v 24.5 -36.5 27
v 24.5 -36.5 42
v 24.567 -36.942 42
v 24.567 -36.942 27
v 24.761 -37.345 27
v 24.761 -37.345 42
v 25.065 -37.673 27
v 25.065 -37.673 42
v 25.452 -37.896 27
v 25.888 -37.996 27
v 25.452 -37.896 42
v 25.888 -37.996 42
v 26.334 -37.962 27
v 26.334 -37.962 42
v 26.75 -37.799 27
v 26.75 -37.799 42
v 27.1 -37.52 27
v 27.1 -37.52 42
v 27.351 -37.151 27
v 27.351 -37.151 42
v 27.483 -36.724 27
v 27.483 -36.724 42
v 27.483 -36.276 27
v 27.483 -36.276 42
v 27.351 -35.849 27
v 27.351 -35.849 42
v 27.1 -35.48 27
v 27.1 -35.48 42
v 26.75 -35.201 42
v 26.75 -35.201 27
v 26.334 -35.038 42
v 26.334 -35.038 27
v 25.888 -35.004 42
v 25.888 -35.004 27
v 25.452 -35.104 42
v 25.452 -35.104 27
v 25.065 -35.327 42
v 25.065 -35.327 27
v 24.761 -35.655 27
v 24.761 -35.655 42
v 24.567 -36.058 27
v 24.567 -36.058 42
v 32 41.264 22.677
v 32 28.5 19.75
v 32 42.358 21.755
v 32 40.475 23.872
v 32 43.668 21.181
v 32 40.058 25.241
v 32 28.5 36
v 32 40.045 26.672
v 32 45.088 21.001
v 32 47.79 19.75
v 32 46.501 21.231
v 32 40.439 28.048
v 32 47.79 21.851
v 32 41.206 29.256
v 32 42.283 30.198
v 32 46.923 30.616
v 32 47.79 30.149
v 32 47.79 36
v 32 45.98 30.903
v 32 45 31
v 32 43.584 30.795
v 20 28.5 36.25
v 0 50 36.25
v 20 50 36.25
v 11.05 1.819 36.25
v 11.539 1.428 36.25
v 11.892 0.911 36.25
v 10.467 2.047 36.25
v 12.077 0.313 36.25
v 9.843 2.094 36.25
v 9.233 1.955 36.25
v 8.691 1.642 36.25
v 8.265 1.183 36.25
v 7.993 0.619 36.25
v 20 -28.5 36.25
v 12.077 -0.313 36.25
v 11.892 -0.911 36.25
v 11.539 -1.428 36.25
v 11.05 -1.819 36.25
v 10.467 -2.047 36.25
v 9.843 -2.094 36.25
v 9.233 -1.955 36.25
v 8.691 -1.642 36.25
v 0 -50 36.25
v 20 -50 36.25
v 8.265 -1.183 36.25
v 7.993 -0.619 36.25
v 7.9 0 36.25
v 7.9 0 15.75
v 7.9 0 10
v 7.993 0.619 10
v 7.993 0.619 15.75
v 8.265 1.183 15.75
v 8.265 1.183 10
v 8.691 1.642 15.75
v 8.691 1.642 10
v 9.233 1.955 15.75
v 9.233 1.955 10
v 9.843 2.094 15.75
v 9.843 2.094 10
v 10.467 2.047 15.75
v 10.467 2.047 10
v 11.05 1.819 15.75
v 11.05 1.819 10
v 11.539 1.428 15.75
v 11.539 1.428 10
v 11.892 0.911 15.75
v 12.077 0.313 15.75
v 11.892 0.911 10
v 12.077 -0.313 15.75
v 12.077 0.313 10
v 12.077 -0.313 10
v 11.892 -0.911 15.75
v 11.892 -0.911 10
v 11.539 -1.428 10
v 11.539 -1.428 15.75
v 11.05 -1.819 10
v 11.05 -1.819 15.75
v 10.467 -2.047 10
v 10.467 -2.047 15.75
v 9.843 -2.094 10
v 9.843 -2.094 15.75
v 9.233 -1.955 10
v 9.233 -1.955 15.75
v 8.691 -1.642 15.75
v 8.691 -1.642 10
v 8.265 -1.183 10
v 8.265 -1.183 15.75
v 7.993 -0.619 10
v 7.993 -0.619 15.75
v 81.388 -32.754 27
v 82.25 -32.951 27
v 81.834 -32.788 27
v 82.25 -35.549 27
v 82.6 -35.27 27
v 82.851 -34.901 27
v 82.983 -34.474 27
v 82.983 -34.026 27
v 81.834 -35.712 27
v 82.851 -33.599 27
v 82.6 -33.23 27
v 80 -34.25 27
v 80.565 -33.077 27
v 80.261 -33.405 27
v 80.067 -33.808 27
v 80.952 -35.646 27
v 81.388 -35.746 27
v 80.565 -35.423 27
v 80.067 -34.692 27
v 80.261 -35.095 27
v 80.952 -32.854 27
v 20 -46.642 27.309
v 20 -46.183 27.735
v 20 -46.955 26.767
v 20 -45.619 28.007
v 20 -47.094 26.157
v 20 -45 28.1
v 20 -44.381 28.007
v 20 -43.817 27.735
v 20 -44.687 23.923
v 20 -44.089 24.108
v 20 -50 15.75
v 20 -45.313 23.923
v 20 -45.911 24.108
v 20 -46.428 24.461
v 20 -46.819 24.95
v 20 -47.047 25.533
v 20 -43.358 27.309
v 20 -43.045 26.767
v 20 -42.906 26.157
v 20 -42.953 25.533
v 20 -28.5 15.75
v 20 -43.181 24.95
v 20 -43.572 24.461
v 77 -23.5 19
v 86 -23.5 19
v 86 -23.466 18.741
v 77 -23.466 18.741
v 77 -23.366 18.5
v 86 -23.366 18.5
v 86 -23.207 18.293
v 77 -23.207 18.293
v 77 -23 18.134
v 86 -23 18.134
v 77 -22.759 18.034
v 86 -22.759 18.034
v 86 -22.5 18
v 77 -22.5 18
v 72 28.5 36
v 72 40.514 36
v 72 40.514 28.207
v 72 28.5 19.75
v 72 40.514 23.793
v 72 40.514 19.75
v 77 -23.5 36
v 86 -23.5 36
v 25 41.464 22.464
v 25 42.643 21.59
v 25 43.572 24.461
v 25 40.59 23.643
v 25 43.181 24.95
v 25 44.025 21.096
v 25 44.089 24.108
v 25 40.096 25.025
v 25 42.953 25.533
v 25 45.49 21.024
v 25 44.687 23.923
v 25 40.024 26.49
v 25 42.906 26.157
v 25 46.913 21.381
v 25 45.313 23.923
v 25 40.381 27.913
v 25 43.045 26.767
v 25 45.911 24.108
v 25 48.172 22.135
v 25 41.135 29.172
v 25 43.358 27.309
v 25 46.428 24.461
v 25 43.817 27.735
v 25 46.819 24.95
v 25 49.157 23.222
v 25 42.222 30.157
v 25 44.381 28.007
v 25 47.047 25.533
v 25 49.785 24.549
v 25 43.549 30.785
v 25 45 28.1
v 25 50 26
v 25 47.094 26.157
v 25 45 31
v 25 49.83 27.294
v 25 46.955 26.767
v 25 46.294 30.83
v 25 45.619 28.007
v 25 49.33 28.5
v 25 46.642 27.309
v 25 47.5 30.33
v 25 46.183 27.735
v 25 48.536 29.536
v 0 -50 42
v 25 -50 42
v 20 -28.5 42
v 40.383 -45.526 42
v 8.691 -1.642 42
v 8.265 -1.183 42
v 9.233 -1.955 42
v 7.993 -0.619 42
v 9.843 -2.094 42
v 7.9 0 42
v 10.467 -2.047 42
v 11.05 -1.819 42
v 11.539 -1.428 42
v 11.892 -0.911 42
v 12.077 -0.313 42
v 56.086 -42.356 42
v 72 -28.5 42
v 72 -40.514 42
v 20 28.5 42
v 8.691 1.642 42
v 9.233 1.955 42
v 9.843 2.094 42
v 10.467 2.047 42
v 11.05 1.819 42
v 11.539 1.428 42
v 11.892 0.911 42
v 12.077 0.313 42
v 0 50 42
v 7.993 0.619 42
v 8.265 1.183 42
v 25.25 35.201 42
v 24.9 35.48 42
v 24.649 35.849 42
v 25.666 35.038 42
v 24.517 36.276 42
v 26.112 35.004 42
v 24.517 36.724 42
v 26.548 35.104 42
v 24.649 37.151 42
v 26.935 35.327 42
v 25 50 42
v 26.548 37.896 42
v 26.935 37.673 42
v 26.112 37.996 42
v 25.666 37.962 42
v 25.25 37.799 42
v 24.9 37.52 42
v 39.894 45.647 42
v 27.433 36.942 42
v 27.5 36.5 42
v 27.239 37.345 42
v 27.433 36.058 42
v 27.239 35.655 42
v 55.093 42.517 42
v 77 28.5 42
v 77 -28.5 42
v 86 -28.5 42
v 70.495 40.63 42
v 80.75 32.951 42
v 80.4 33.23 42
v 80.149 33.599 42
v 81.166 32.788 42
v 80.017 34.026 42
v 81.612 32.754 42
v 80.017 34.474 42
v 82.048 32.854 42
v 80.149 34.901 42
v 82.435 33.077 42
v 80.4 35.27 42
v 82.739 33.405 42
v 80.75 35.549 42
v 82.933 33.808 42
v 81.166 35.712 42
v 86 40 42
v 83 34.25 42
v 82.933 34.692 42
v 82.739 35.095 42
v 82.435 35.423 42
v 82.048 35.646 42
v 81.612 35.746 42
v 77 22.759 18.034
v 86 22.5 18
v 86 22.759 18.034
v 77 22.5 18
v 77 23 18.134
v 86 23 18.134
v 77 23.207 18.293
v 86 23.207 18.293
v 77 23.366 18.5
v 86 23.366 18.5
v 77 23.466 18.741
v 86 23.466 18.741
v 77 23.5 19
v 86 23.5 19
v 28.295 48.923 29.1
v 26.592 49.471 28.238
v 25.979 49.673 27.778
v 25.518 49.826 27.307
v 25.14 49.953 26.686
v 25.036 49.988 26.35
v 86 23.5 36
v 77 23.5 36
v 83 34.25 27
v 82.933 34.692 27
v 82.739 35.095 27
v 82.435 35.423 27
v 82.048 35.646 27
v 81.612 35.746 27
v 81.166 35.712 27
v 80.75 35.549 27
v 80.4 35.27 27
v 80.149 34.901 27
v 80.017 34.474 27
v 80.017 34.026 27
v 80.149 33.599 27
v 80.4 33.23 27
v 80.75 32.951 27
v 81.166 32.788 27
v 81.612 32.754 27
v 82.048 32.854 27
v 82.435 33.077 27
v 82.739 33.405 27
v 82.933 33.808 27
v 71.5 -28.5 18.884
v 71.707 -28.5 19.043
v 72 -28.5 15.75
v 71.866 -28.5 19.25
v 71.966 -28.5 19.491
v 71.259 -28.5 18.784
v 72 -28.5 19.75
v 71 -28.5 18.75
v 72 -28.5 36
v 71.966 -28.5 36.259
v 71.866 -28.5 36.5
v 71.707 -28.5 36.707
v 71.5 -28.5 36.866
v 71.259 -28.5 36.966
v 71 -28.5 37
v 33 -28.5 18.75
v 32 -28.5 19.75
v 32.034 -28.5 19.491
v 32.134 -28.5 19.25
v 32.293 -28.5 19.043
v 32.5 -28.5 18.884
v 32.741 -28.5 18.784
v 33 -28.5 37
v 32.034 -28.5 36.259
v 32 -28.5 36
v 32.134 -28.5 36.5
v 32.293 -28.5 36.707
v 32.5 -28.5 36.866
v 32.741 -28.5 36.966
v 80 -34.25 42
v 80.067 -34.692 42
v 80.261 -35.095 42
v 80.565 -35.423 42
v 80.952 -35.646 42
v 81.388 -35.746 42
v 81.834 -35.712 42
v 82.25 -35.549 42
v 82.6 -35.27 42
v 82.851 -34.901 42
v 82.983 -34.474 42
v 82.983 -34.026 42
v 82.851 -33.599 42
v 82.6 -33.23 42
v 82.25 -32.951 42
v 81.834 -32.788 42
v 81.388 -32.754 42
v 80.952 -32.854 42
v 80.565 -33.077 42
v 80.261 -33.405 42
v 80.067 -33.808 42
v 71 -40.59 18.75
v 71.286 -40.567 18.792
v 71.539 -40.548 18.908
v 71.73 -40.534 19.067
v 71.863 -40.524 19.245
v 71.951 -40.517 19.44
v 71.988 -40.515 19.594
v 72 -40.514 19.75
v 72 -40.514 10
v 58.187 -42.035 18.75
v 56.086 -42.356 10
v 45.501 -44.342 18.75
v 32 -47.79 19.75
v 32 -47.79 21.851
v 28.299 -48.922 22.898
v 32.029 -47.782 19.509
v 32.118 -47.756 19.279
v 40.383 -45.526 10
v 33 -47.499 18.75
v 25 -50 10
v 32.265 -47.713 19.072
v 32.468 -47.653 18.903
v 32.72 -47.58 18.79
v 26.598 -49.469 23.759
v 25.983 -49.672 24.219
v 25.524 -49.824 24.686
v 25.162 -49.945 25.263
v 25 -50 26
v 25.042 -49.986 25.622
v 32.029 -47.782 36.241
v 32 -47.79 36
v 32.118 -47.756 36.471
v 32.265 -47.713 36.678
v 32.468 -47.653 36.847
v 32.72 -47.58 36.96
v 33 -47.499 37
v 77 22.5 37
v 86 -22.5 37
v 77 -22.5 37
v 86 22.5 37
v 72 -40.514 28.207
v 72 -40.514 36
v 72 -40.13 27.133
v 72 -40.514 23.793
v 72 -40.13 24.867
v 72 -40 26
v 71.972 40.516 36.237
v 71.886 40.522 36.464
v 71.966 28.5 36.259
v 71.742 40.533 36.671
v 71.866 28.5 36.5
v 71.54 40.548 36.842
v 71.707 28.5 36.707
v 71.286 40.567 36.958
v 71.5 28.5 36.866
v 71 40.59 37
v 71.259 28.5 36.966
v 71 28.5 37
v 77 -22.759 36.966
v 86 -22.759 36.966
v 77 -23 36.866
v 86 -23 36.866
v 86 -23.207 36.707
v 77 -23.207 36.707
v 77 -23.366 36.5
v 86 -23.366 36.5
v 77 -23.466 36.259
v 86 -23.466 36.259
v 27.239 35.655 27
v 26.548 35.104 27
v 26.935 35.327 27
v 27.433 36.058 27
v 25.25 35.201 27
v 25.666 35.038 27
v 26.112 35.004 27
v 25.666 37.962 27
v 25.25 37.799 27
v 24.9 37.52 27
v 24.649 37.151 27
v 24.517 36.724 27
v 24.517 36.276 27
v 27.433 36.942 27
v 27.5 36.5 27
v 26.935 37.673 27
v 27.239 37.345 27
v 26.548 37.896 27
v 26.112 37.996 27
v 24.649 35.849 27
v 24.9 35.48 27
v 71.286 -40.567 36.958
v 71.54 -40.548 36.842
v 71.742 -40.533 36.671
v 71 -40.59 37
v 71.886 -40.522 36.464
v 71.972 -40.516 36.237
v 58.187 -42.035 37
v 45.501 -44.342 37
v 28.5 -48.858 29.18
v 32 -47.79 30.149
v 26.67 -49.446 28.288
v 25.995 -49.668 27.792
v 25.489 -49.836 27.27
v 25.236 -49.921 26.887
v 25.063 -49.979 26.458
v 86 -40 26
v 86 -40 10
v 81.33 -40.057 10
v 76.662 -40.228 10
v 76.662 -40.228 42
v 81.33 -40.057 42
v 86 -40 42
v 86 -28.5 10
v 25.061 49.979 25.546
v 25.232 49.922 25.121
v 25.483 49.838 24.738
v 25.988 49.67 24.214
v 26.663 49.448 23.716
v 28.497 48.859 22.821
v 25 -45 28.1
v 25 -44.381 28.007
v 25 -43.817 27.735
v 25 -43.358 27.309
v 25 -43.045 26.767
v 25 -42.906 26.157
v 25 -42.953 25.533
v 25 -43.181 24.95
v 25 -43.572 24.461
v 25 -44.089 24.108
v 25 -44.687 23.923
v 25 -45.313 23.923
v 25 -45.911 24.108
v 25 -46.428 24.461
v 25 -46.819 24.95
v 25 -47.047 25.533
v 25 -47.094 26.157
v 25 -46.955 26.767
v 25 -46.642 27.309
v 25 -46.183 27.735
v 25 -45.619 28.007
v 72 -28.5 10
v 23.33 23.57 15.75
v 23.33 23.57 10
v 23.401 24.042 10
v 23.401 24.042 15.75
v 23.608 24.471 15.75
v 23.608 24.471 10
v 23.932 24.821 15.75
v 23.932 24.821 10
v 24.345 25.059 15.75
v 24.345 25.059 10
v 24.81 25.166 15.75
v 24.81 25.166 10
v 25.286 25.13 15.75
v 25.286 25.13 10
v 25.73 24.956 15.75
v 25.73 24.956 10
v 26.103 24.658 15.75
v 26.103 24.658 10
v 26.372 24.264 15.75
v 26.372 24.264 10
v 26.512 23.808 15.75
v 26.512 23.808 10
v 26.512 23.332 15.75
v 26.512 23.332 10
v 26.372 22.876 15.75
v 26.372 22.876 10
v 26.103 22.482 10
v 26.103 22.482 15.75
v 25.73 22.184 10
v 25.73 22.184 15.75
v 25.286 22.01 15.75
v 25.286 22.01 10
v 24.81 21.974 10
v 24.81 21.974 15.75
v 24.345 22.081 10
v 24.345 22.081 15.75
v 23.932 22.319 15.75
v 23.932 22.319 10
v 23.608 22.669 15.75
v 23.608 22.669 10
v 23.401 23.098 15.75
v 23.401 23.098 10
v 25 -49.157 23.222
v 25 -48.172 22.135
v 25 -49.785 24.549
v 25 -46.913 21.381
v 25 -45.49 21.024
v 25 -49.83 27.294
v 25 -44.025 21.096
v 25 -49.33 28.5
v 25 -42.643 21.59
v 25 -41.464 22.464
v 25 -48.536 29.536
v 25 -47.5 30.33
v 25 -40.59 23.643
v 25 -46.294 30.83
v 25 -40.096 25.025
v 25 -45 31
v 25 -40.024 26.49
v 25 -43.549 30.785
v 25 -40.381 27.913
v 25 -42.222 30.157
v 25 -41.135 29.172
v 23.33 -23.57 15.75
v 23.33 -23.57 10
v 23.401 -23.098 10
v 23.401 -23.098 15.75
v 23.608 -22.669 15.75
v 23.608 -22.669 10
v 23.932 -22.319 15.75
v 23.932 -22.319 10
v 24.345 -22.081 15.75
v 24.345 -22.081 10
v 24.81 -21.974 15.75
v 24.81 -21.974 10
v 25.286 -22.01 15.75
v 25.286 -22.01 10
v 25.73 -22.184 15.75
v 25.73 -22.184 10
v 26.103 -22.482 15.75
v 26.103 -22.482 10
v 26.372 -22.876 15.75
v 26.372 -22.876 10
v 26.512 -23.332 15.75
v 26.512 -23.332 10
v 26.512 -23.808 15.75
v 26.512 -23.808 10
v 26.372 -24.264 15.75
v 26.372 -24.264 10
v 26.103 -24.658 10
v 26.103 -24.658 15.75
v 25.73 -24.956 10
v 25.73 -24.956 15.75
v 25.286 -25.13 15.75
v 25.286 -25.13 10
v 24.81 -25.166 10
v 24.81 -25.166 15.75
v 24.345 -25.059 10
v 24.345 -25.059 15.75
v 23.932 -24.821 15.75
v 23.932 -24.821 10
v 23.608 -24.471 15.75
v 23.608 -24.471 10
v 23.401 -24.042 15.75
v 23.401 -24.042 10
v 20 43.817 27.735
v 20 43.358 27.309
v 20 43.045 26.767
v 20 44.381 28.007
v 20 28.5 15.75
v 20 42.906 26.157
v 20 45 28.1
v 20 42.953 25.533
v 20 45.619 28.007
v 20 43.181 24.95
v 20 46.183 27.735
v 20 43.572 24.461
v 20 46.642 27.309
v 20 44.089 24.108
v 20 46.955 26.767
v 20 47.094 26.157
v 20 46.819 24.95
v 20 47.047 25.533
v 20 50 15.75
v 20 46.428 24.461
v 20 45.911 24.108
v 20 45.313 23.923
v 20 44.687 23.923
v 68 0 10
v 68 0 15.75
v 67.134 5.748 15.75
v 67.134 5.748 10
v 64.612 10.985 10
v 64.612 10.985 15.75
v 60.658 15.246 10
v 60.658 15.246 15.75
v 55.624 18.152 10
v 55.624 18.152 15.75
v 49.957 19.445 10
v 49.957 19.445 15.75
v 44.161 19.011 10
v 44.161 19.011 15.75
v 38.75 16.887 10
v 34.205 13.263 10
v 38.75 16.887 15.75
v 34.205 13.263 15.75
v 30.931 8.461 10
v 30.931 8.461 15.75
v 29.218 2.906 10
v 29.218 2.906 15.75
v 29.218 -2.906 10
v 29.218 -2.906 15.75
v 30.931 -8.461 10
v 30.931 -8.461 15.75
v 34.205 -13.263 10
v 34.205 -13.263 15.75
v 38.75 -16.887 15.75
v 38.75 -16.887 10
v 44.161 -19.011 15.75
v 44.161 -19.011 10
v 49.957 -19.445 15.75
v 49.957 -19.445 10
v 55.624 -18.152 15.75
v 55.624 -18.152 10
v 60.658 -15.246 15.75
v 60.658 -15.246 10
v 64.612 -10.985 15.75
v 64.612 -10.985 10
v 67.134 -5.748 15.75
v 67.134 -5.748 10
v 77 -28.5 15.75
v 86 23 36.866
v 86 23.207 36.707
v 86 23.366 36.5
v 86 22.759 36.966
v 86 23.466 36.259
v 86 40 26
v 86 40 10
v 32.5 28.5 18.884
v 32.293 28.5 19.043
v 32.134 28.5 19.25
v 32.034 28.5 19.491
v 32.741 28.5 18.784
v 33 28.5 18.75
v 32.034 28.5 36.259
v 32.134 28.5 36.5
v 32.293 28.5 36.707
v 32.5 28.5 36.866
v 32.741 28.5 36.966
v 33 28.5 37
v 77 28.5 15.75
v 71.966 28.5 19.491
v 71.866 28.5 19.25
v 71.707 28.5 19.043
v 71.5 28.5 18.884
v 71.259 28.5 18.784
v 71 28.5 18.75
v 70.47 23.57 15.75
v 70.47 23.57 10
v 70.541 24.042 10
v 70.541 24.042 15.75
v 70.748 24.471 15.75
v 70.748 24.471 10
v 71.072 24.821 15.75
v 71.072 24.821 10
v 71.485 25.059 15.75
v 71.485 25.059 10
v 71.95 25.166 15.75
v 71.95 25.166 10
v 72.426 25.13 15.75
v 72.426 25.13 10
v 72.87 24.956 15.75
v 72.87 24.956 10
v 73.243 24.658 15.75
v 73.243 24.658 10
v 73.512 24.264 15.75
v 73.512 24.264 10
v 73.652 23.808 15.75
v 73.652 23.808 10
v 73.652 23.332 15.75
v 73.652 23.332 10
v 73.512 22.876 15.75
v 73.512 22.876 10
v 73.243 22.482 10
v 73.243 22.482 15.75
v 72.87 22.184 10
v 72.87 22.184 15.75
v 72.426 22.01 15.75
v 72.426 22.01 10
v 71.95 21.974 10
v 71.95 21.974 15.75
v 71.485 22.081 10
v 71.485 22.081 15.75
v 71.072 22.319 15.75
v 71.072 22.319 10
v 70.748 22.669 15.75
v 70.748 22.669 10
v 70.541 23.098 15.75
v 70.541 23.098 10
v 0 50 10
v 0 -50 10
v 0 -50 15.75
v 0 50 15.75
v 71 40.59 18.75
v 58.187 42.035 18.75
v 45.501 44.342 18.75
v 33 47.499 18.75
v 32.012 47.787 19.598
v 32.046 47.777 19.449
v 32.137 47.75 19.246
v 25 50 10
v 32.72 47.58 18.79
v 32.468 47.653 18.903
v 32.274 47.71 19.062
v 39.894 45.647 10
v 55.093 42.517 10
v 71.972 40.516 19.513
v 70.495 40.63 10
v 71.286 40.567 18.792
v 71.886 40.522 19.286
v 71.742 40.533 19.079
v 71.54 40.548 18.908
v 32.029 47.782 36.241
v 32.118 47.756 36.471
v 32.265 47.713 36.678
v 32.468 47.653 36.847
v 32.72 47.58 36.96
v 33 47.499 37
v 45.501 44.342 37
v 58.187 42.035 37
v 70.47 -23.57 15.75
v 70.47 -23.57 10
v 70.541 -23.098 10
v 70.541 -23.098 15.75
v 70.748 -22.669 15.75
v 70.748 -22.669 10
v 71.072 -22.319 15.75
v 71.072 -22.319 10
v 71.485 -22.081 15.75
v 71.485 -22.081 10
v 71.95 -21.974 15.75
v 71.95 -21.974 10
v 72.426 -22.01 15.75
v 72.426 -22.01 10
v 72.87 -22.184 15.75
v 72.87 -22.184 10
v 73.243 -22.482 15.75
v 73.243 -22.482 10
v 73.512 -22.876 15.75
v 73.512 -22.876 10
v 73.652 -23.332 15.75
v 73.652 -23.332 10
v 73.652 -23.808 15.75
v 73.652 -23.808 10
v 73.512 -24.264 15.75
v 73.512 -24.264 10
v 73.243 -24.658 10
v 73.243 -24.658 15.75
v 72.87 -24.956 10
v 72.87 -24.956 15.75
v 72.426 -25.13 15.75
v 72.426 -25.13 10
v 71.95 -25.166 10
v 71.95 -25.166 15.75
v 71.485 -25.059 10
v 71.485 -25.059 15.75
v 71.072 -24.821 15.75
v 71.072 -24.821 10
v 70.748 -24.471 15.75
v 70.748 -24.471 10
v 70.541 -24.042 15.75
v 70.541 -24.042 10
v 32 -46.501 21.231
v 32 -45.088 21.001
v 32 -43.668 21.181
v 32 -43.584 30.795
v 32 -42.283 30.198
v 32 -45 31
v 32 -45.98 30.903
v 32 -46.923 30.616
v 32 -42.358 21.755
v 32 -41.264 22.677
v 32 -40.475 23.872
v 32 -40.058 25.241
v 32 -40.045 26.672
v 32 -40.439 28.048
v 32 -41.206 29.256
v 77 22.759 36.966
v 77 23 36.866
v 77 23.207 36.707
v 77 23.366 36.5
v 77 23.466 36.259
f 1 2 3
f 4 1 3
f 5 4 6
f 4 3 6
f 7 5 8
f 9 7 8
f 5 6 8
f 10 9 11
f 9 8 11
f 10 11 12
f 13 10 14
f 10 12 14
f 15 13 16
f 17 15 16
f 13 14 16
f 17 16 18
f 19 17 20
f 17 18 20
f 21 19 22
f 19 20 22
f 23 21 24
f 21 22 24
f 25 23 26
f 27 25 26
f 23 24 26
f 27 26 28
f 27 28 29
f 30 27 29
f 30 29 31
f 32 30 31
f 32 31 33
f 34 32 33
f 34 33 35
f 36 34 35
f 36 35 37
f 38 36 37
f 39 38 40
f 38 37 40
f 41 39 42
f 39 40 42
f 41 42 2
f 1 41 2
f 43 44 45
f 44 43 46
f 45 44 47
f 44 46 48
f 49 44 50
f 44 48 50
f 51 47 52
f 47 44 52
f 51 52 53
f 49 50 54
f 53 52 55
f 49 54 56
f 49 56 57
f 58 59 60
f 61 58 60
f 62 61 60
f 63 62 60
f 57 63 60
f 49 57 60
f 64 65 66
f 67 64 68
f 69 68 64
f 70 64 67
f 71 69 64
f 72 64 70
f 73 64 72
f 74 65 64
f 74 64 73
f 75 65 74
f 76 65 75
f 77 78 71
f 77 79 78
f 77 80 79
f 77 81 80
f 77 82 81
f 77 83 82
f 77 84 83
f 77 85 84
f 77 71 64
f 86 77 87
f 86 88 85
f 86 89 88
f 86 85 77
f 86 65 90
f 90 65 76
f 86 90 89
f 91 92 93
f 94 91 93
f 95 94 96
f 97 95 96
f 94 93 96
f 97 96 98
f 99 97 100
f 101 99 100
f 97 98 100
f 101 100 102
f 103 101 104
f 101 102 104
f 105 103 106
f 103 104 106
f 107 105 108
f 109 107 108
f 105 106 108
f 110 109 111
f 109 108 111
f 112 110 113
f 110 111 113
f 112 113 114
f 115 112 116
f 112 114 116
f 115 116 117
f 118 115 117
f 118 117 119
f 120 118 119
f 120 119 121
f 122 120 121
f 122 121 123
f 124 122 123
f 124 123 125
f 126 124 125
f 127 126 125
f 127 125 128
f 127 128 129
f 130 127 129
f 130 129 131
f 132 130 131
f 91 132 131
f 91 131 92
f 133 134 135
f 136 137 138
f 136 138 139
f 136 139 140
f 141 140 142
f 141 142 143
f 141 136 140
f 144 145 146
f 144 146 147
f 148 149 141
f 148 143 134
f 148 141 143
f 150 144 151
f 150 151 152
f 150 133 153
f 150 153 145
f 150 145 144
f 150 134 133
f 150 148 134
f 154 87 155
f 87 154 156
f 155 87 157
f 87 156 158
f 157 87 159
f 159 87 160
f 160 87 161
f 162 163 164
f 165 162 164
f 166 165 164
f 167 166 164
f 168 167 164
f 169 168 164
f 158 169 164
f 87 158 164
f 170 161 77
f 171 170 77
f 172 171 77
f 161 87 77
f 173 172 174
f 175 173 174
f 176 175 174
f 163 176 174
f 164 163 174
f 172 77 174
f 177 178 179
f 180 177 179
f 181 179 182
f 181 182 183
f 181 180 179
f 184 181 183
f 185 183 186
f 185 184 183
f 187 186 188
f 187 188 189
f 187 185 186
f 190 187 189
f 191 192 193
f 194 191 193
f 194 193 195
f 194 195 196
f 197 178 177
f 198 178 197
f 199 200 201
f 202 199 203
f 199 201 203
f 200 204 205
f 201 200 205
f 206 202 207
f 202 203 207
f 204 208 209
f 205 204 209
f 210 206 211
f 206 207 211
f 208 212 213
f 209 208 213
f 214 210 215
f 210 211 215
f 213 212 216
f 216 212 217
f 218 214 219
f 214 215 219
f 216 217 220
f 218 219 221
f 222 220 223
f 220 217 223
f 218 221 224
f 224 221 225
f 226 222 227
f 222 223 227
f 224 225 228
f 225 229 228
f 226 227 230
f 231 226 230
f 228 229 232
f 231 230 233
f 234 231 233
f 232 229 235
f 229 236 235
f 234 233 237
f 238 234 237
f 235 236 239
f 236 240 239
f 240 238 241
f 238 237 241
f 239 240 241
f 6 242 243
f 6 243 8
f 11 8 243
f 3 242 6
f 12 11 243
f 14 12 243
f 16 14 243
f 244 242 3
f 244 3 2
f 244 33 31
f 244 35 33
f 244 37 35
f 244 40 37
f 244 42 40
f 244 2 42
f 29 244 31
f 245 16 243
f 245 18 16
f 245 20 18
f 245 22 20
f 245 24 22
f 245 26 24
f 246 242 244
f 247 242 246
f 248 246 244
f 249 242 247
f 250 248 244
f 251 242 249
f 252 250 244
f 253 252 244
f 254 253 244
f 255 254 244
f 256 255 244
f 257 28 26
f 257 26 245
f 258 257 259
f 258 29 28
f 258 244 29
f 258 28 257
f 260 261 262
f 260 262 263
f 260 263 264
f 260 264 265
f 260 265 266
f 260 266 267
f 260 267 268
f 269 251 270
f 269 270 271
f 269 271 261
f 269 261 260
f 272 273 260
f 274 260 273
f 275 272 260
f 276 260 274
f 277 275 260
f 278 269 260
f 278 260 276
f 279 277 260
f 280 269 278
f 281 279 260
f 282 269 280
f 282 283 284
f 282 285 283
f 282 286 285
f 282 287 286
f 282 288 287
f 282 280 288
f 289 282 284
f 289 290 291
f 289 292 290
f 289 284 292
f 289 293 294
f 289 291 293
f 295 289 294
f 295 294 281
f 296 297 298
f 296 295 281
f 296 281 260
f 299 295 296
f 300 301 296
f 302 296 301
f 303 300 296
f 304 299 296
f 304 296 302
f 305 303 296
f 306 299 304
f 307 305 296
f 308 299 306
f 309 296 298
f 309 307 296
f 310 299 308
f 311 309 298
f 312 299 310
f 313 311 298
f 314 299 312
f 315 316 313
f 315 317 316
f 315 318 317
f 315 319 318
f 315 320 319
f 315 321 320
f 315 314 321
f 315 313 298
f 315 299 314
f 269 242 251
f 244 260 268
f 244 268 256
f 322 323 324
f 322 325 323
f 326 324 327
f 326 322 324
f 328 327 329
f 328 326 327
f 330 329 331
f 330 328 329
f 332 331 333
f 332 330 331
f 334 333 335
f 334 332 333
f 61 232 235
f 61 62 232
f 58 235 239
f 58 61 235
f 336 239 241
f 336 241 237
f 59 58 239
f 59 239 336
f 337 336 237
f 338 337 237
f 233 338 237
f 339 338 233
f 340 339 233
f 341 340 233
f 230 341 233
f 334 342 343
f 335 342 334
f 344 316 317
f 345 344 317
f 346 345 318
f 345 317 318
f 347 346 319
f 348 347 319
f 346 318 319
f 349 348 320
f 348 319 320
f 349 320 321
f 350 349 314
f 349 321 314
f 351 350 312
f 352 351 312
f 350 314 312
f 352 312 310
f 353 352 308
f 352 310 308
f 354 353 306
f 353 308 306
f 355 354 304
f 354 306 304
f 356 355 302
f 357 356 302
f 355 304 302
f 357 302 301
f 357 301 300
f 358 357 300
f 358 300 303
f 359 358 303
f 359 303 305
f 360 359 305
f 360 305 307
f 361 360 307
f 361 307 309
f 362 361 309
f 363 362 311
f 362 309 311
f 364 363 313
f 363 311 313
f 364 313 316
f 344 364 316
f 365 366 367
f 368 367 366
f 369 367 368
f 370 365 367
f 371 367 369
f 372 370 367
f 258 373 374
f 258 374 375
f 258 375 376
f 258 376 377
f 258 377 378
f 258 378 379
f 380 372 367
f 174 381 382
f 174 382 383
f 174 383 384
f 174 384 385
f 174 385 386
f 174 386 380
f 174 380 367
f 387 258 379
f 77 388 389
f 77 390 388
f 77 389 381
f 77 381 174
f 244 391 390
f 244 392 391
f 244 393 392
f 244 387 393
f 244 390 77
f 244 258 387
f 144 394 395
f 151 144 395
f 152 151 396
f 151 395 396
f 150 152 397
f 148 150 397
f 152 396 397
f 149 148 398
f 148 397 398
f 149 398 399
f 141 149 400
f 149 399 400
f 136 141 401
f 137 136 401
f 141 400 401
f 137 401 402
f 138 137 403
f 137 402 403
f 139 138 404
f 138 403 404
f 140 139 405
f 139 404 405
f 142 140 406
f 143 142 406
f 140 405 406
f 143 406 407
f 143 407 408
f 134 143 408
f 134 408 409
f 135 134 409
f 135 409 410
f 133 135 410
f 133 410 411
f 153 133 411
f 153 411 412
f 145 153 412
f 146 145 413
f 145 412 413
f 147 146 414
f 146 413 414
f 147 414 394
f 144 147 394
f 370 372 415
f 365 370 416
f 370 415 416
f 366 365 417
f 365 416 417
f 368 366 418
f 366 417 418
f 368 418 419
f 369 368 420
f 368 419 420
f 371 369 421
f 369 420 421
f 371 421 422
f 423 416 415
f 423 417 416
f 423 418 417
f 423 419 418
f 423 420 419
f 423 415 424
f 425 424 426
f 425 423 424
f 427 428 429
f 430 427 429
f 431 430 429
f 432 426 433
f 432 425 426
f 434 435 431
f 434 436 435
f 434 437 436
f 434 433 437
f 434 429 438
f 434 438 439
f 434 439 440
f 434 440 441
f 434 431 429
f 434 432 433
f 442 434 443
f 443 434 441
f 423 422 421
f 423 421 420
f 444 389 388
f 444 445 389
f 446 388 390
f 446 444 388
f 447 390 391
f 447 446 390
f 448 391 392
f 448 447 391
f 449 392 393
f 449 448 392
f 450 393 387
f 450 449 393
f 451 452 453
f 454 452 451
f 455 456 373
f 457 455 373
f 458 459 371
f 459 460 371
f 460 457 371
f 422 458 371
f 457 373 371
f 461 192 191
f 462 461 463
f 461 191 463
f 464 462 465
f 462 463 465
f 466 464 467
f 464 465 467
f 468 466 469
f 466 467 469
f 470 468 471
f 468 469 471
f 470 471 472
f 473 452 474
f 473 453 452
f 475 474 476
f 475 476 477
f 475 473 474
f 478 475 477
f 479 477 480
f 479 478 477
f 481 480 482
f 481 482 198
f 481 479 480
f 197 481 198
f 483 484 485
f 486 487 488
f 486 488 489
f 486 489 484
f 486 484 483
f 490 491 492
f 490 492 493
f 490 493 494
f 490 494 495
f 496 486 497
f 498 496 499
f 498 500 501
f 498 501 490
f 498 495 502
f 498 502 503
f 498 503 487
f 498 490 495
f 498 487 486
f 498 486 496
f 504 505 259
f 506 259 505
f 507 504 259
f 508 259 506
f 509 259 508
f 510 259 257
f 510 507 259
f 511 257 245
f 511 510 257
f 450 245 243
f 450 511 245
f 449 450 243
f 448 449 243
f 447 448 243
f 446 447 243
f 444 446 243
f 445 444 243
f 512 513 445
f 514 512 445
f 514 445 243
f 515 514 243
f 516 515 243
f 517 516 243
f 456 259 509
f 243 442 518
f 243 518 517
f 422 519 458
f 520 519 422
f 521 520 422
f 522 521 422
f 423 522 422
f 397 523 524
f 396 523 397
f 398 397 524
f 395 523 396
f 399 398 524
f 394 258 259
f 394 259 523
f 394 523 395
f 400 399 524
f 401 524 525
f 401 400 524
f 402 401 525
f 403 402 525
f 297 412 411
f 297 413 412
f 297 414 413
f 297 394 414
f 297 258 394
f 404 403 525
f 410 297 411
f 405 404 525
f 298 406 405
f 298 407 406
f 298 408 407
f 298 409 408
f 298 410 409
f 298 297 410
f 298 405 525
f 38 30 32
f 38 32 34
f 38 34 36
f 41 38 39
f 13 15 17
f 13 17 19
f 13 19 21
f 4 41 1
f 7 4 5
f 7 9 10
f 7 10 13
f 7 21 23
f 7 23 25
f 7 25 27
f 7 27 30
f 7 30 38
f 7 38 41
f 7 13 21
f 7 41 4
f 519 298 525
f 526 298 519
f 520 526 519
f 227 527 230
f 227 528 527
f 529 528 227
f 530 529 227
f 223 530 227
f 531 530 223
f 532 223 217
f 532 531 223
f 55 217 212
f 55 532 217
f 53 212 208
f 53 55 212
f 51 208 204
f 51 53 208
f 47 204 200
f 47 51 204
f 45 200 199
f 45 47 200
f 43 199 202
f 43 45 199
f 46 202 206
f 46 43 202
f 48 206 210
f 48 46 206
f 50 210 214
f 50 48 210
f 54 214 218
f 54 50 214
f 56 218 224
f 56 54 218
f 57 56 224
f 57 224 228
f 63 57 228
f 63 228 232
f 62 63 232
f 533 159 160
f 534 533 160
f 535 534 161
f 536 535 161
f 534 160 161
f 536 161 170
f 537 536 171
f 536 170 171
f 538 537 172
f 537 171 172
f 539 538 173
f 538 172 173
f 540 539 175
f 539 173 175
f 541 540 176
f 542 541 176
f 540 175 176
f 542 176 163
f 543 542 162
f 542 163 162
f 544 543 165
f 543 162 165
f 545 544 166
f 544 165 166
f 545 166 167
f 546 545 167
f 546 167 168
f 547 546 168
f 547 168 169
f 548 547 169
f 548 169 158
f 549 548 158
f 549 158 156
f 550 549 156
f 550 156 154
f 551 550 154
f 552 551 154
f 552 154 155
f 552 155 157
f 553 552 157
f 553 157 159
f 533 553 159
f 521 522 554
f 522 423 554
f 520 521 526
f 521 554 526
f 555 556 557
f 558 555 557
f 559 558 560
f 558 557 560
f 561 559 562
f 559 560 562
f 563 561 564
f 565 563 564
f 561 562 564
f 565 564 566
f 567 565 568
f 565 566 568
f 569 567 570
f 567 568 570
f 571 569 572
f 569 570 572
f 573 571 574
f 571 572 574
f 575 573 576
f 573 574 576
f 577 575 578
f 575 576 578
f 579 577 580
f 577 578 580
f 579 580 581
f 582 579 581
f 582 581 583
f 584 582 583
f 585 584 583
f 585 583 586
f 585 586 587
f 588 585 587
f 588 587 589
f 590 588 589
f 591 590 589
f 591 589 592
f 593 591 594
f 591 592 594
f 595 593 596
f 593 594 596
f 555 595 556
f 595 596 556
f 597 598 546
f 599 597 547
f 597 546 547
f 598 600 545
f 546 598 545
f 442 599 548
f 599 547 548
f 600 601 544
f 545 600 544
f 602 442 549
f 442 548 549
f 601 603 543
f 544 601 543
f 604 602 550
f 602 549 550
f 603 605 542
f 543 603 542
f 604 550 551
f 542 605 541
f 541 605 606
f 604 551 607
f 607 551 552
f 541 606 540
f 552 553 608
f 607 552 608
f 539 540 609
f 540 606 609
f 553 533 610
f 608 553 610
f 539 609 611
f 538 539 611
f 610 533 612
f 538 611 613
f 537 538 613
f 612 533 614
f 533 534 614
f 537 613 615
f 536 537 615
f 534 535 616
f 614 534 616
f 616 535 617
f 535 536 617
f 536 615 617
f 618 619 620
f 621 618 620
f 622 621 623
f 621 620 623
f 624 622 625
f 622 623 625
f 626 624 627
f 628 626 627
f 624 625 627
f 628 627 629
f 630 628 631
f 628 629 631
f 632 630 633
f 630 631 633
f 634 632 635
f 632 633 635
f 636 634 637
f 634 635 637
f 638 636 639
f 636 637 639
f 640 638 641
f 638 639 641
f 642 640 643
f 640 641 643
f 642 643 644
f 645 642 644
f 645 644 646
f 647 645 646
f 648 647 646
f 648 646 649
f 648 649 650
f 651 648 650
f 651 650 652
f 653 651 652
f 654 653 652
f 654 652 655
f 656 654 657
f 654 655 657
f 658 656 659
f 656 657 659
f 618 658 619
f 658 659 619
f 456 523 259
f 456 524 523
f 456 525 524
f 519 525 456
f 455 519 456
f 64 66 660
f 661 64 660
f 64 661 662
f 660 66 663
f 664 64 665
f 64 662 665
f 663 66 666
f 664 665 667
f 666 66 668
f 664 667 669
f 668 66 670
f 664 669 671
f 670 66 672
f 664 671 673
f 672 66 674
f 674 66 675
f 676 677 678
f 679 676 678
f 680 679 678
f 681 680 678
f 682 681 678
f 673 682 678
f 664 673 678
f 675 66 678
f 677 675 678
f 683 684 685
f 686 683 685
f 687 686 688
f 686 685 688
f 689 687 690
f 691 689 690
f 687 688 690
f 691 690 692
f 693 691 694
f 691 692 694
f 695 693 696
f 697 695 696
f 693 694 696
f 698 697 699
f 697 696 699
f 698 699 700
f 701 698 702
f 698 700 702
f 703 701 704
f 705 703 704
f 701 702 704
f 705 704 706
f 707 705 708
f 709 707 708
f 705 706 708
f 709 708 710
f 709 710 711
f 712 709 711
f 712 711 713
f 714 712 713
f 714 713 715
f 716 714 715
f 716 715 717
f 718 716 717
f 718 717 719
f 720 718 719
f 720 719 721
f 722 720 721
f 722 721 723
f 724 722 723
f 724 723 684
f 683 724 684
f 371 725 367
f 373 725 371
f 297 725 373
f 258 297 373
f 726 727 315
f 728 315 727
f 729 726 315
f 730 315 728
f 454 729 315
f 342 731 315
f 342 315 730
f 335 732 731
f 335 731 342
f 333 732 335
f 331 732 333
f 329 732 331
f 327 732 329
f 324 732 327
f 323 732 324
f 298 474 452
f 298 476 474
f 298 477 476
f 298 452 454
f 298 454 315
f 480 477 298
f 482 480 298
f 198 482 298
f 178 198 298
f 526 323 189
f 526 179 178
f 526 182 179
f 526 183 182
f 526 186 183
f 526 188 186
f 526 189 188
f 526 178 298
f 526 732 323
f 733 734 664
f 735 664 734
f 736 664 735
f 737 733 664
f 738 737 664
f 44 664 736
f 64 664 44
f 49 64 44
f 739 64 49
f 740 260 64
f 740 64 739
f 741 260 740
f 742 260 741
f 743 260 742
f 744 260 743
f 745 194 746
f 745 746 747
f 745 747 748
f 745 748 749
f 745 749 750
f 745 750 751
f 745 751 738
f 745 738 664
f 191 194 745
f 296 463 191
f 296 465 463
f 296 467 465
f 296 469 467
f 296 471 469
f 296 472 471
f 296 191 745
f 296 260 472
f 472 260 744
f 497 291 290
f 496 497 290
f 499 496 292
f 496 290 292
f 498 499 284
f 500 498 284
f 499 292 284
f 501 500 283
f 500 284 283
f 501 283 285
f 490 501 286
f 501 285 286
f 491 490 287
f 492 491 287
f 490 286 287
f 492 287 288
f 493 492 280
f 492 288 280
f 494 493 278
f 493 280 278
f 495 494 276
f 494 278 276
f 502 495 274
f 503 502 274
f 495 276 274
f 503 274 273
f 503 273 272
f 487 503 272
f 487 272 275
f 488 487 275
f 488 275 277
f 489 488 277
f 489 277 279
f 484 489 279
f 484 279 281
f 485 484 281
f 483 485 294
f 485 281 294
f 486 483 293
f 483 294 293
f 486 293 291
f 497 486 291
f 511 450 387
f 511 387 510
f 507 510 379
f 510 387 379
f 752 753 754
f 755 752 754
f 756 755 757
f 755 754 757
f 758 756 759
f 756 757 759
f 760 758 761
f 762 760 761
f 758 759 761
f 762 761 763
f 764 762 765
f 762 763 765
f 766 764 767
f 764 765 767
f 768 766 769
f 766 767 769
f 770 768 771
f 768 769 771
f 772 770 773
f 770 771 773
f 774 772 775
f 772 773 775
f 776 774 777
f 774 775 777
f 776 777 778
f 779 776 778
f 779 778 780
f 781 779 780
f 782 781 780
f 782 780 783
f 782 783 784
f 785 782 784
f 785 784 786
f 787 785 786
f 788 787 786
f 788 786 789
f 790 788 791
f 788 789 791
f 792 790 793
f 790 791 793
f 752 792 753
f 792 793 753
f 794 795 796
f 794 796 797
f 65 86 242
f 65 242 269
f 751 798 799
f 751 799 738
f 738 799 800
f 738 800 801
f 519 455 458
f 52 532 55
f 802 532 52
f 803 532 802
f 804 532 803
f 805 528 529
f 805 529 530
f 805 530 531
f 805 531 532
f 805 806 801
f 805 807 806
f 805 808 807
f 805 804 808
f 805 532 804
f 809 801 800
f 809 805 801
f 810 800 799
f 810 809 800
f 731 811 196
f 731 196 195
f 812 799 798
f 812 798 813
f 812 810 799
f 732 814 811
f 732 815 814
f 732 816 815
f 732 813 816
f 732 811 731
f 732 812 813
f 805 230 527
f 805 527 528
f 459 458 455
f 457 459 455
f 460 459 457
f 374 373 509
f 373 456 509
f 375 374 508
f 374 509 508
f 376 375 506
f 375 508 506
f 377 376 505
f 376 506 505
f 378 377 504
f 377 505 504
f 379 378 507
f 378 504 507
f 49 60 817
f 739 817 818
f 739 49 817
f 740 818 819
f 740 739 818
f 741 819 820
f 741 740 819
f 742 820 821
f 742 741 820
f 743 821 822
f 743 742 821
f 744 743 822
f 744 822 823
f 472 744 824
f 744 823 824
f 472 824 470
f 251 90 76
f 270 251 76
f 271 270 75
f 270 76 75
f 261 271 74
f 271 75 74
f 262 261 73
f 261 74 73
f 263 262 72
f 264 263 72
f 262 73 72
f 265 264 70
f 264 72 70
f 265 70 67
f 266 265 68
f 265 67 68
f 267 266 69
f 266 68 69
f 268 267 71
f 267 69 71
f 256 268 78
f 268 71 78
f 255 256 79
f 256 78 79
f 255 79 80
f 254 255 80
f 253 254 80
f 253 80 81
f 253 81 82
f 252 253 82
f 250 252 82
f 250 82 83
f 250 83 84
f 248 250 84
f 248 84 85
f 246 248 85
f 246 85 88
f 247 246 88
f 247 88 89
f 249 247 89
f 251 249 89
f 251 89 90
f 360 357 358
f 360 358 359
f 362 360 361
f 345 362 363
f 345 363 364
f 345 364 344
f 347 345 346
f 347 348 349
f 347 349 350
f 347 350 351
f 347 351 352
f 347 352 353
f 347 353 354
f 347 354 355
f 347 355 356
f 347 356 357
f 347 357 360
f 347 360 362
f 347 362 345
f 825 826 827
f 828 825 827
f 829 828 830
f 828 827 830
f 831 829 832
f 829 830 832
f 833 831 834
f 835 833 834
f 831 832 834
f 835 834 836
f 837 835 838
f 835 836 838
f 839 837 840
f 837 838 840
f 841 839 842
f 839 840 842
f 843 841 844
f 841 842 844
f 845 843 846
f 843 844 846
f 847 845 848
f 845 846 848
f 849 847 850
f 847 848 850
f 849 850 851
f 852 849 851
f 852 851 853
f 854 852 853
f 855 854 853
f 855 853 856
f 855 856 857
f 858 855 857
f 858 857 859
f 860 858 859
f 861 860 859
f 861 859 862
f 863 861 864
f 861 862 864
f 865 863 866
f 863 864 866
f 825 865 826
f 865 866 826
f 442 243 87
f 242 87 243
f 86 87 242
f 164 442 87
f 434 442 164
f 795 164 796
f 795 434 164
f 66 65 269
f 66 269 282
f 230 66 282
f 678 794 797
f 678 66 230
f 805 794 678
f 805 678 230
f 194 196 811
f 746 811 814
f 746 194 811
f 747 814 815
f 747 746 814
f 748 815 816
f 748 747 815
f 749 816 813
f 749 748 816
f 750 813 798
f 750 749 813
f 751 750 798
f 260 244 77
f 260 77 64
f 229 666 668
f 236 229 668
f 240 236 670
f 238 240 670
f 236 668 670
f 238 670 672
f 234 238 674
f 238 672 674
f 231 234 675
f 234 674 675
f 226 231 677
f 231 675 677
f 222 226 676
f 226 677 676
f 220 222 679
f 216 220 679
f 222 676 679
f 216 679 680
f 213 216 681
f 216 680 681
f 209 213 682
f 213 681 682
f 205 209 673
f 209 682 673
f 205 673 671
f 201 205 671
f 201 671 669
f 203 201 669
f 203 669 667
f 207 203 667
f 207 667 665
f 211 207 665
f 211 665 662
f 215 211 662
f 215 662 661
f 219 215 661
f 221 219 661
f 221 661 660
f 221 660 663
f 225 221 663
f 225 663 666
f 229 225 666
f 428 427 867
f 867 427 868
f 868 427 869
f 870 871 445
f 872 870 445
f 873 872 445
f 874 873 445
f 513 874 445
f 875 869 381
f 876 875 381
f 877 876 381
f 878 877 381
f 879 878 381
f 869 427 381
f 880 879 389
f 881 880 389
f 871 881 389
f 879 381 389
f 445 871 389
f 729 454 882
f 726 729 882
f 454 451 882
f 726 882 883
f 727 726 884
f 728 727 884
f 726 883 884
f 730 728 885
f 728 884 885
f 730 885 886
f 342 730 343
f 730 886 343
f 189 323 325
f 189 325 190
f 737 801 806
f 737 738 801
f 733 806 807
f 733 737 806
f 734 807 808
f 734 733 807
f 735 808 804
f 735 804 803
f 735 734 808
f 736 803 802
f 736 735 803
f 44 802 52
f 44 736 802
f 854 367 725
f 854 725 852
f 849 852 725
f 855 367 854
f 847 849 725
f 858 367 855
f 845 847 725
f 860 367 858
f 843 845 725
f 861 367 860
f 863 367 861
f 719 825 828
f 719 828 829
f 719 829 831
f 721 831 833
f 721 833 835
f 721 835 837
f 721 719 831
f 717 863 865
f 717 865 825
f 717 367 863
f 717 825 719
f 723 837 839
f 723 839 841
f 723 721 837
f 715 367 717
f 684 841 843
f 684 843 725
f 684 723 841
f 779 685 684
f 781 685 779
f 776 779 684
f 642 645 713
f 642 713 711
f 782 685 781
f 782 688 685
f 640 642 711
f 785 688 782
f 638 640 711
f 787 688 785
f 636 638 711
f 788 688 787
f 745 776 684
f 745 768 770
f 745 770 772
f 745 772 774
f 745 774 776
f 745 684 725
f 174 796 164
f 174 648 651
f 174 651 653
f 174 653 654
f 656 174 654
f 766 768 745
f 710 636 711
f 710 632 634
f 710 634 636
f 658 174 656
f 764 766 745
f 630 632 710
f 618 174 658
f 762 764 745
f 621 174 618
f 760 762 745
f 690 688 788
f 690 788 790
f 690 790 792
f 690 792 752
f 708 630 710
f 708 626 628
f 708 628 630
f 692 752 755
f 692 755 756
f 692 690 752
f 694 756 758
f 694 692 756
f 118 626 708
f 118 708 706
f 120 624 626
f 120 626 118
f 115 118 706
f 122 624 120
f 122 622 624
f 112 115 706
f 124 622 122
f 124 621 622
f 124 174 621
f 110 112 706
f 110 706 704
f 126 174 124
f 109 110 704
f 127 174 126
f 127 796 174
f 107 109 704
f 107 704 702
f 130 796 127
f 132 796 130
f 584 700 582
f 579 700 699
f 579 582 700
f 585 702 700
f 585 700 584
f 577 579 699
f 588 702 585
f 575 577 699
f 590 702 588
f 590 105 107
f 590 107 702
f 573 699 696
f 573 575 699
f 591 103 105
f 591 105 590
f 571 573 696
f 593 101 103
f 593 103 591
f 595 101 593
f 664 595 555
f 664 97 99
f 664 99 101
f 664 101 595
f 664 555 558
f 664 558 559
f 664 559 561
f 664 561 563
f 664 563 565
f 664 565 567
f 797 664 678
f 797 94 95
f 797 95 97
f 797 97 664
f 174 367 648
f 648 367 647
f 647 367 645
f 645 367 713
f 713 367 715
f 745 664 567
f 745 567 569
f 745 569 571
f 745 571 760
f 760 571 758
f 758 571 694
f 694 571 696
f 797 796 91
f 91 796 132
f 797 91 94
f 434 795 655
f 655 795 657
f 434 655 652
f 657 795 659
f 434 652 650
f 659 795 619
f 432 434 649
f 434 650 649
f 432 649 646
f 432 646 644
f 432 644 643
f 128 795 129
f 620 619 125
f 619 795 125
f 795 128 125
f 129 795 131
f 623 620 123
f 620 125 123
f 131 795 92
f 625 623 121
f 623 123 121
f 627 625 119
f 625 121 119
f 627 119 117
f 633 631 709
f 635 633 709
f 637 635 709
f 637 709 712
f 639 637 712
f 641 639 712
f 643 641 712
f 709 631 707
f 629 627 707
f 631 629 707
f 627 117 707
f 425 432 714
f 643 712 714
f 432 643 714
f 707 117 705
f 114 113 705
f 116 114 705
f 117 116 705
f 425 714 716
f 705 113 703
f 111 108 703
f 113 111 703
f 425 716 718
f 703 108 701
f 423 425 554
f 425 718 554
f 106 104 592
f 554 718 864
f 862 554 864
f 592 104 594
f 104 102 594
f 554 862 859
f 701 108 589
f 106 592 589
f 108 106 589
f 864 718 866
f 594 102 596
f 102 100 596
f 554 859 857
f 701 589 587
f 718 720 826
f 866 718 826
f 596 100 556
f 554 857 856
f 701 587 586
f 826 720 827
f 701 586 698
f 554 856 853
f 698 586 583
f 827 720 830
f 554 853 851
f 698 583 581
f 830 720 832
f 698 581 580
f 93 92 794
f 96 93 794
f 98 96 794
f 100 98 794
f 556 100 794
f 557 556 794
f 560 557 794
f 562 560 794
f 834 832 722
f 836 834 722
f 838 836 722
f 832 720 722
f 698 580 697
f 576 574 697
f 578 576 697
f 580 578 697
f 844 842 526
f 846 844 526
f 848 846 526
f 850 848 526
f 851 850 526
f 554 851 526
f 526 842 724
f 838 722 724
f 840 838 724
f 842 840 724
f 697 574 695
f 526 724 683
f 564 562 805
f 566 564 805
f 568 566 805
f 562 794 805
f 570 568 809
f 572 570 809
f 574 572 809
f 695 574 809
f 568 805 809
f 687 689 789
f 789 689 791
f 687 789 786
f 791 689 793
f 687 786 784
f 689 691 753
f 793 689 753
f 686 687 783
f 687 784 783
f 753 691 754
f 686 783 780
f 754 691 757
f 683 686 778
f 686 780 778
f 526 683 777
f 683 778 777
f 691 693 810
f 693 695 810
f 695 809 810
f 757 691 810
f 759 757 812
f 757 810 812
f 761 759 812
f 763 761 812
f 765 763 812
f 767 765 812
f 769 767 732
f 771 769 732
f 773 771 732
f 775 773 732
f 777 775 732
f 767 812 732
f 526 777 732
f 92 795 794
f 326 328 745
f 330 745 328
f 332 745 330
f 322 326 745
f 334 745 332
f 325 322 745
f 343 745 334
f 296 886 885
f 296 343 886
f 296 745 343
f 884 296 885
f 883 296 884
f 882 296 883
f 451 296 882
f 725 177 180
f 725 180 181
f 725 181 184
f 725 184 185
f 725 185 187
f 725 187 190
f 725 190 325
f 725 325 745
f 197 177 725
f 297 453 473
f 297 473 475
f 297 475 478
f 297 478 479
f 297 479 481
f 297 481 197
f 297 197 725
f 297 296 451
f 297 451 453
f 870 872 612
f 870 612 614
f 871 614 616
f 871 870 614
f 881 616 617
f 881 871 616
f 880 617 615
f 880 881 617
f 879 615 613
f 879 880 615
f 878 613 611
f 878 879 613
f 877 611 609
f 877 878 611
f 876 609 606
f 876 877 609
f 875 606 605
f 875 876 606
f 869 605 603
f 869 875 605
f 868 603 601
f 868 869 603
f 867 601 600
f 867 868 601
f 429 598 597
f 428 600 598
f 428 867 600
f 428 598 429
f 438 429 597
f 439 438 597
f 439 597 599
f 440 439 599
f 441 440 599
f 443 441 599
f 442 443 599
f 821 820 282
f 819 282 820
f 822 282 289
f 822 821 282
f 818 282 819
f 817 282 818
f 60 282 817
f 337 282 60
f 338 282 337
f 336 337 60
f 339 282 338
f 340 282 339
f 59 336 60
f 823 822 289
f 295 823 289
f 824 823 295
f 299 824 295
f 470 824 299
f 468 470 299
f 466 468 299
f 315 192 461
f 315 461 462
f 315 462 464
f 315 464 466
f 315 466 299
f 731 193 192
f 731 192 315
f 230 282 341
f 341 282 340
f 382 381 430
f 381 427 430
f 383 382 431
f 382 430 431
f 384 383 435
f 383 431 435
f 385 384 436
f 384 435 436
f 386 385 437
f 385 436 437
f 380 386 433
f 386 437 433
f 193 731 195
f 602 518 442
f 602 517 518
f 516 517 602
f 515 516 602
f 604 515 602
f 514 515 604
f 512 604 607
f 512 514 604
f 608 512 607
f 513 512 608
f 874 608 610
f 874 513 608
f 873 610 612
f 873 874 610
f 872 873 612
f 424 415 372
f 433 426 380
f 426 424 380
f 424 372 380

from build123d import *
from build123d.topology import SkipClean

# Parameters (mm, degrees)
EXTRUDE_1_DEPTH           = 52
CUT_EXTRUDE_1_DEPTH       = 113.24972160321826
CUT_EXTRUDE_2_DEPTH       = 20
CUT_EXTRUDE_3_DEPTH       = 10
CUT_EXTRUDE_START         = -10
CUT_EXTRUDE_4_DEPTH       = 10
EXTRUDE_2_DEPTH           = 5.75
SKETCH_7_R                = 19.499999999999996
CUT_EXTRUDE_5_DEPTH       = 103.88373292216811
SKETCH_8_R                = 2.1
CUT_EXTRUDE_6_DEPTH       = 93.84395510748136
CUT_EXTRUDE_START_2       = -61.0000001
CUT_EXTRUDE_7_OUTLINE_R   = 5
CUT_EXTRUDE_7_OUTLINE_R_2 = 2.1
CUT_EXTRUDE_7_DEPTH       = 61.0000001
SKETCH_12_R               = 2.099999999999999
CUT_EXTRUDE_8_DEPTH       = 105.49880398167254
SKETCH_14_R               = 1.600000000000005
CUT_EXTRUDE_9_DEPTH       = 5.75
CUT_EXTRUDE_10_DEPTH      = 9
CUT_EXTRUDE1_DEPTH        = 124.78307655451134
CUT_EXTRUDE1_DEPTH_BACK   = 124.78307655451134
FILLET_1_R                = 1
FILLET_2_R                = 1
FILLET_3_R                = 1
EXTRUDE_START             = -32
EXTRUDE_3_DEPTH           = 32
EXTRUDE_4_DEPTH           = 32
SKETCH_18_R               = 1.4999999999999973
SKETCH_18_R_2             = 1.5000000000000009
CUT_EXTRUDE_11_DEPTH      = 15


# Read off the part's stored shape, not the designer's step: Вырез-Вытянуть7
with BuildPart() as part:
    # Эскиз1 → Бобышка-Вытянуть1 (new body)
    with BuildSketch(Plane.XY):
        with BuildLine():
            Line((0, -50), (0, 50))
            Line((0, 50), (25, 50))
            ThreePointArc((25, 50), (55.092881078948835, 42.516574581587776), (86, 40))
            Line((86, 40), (86, -40))
            ThreePointArc((86, -40), (55.09288107894883, -42.516574581587776), (25, -50))
            Line((25, -50), (0, -50))
        make_face()
    extrude(amount=EXTRUDE_1_DEPTH)

    # Эскиз2 → Вырез-Вытянуть1 (cut, through all)
    with BuildSketch(Plane.XY.offset(52)):
        Polygon((77, 28.5), (77.00000000000001, -28.5), (20.000000000000004, -28.50000000000001), (19.999999999999996, 28.499999999999996), align=None)
    extrude(amount=-CUT_EXTRUDE_1_DEPTH, mode=Mode.SUBTRACT)

    # Эскиз3 → Вырез-Вытянуть2 (cut)
    with BuildSketch(Plane.ZY):
        Polygon((15.75, 50), (36.25, 50), (36.25000000000001, -50), (15.74999999999999, -50), align=None)
    extrude(amount=-CUT_EXTRUDE_2_DEPTH, mode=Mode.SUBTRACT)

    # Эскиз4 → Вырез-Вытянуть3 (cut)
    with BuildSketch(Plane(origin=(0, 0, 0), x_dir=(-1, 0, 0), z_dir=(0, 0, -1))):
        with BuildLine():
            Line((0, 50), (-24.999999999999968, 50.00000000000003))
            ThreePointArc((-24.999999999999968, 50.00000000000003), (-55.092881078948814, 42.516574581587804), (-86.00000000000003, 40.00000000000001))
            Line((-86.00000000000003, 40.00000000000001), (-85.99999999999999, -39.99999999999998))
            ThreePointArc((-85.99999999999999, -39.99999999999998), (-55.09288107894881, -42.516574581587776), (-24.999999999999993, -50))
            Line((-24.999999999999993, -50), (0, -50))
            Line((0, -50), (0, 50))
        make_face()
    extrude(amount=-CUT_EXTRUDE_3_DEPTH, mode=Mode.SUBTRACT)

    # Эскиз5 → Вырез-Вытянуть4 (cut)
    with BuildSketch(Plane.XY.offset(52).offset(CUT_EXTRUDE_START)):
        with BuildLine():
            Line((24.999999999999968, 50.00000000000003), (0, 50))
            Line((0, 50), (0, -50))
            Line((0, -50), (25, -50))
            ThreePointArc((25, -50), (55.09288107894883, -42.516574581587776), (85.99999999999997, -39.99999999999998))
            Line((85.99999999999997, -39.99999999999998), (86, 40))
            ThreePointArc((86, 40), (55.092881078948835, 42.516574581587804), (24.999999999999968, 50.00000000000003))
        make_face()
    extrude(amount=CUT_EXTRUDE_4_DEPTH, mode=Mode.SUBTRACT)

    # Эскиз6 → Бобышка-Вытянуть2 (add)
    with BuildSketch(Plane(origin=(0, 0, 10), x_dir=(-1, 0, 0), z_dir=(0, 0, -1))):
        Polygon((-20.000000000000004, -28.50000000000001), (-77.00000000000001, -28.5), (-77, 28.5), (-19.999999999999996, 28.499999999999996), align=None)
    extrude(amount=-EXTRUDE_2_DEPTH)

    # Эскиз7 → Вырез-Вытянуть5 (cut, through all)
    with BuildSketch(Plane.XY.offset(15.749999999999993)):
        with Locations((48.50000000000001, 0)):
            Circle(SKETCH_7_R)
    extrude(amount=-CUT_EXTRUDE_5_DEPTH, mode=Mode.SUBTRACT)

    # Эскиз8 → Вырез-Вытянуть6 (cut, through all)
    with BuildSketch(Plane.ZY.offset(-20)):
        with Locations((26, -45.00000000000001)):
            Circle(SKETCH_8_R)
        with Locations((26, 45)):
            Circle(SKETCH_8_R)
    extrude(amount=-CUT_EXTRUDE_6_DEPTH, mode=Mode.SUBTRACT)

    # Вырез-Вытянуть7 outline → Вырез-Вытянуть7 (cut)
    # profile 1 of 2: a face of its own
    with BuildSketch(Plane.ZY.offset(-25).offset(CUT_EXTRUDE_START_2)):
        with Locations((26, 45)):
            Circle(CUT_EXTRUDE_7_OUTLINE_R)
        with Locations((26, 45)):
            Circle(CUT_EXTRUDE_7_OUTLINE_R_2, mode=Mode.SUBTRACT)
    # profile 2 of 2: a face of its own
    with BuildSketch(Plane.ZY.offset(-25).offset(CUT_EXTRUDE_START_2)):
        with Locations((26, -45)):
            Circle(CUT_EXTRUDE_7_OUTLINE_R)
        with Locations((26, -45)):
            Circle(CUT_EXTRUDE_7_OUTLINE_R_2, mode=Mode.SUBTRACT)
    extrude(amount=CUT_EXTRUDE_7_DEPTH, mode=Mode.SUBTRACT)

    # Эскиз12 → Вырез-Вытянуть8 (cut, through all)
    with BuildSketch(Plane(origin=(0, 0, 10), x_dir=(-1, 0, 0), z_dir=(0, 0, -1))):
        with Locations((-10, 0)):
            Circle(SKETCH_12_R)
    extrude(amount=-CUT_EXTRUDE_8_DEPTH, mode=Mode.SUBTRACT)

    # Эскиз14 → Вырез-Вытянуть9 (cut)
    with BuildSketch(Plane(origin=(0, 0, 10), x_dir=(-1, 0, 0), z_dir=(0, 0, -1))):
        with Locations((-72.07000000000002, 23.569999999999993)):
            Circle(SKETCH_14_R)
        with Locations((-24.930000000000014, 23.57)):
            Circle(SKETCH_14_R)
        with Locations((-24.930000000000007, -23.57)):
            Circle(SKETCH_14_R)
        with Locations((-72.07000000000001, -23.570000000000007)):
            Circle(SKETCH_14_R)
    extrude(amount=-CUT_EXTRUDE_9_DEPTH, mode=Mode.SUBTRACT)

    # Эскиз15 → Вырез-Вытянуть10 (cut)
    with BuildSketch(Plane(origin=(86, 0, 0), x_dir=(0, 0, -1), z_dir=(1, 0, 0))):
        Polygon((-37, 23.499999999999996), (-18.000000000000004, 23.499999999999996), (-18, -23.500000000000004), (-37, -23.500000000000004), align=None)
    extrude(amount=-CUT_EXTRUDE_10_DEPTH, mode=Mode.SUBTRACT)

    # Sketch1 → Cut-Extrude1 (cut, two sides: drawn at the far end of the back side and taken through both)
    with BuildSketch(Plane.XZ.offset(-28.499999999999996).offset(-CUT_EXTRUDE1_DEPTH_BACK)):
        Polygon((72, 37), (72, 18.749999999999986), (31.999999999999993, 18.74999999999998), (31.999999999999986, 36.99999999999999), align=None)
    extrude(amount=CUT_EXTRUDE1_DEPTH + CUT_EXTRUDE1_DEPTH_BACK, mode=Mode.SUBTRACT)

    # Скругление1
    fillet_1_edges = [part.edges().sort_by_distance(p)[0] for p in [
        (81.5, -23.500000000000004, 37),
        (81.5, 23.499999999999996, 37),
        (81.5, 23.499999999999996, 18.000000000000004),
        (81.5, -23.500000000000004, 18),
    ]]
    fillet(fillet_1_edges, radius=FILLET_1_R)

    # Скругление2
    fillet_2_edges = [part.edges().sort_by_distance(p)[0] for p in [
        (31.999999999999986, 38.145170659331654, 36.99999999999999),
        (71.99999999999999, 34.50682260061859, 18.749999999999986),
        (71.99999999999999, 34.506822600618605, 37),
        (31.999999999999993, 38.14517065933167, 18.74999999999998),
    ]]
    fillet(fillet_2_edges, radius=FILLET_2_R)

    # Скругление3
    fillet_3_edges = [part.edges().sort_by_distance(p)[0] for p in [
        (31.999999999999996, -38.14517065933168, 36.99999999999999),
        (72, -34.50682260061862, 18.749999999999986),
        (72, -34.50682260061859, 37),
        (32.00000000000001, -38.14517065933168, 18.74999999999998),
    ]]
    fillet(fillet_3_edges, radius=FILLET_3_R)

    # Эскиз16 → Бобышка-Вытянуть3 (add)
    with BuildSketch(Plane.XY.offset(41.99999999999999).offset(EXTRUDE_START)):
        with BuildLine():
            Line((72, 40.51364520123729), (72, 28.5))
            Line((72, 28.5), (86, 28.499999999999996))
            Line((86, 28.499999999999996), (86, 40))
            ThreePointArc((86, 40), (78.99529030949971, 40.12845448417352), (72, 40.51364520123729))
        make_face()
    extrude(amount=EXTRUDE_3_DEPTH)

    # Эскиз17 → Бобышка-Вытянуть4 (add)
    with SkipClean():  # the faces are left unmerged after this step: merging them gives an invalid solid
        with BuildSketch(Plane.XY.offset(41.99999999999999).offset(EXTRUDE_START)):
            with BuildLine():
                Line((85.99999999999997, -39.99999999999998), (85.99999999999997, -28.5))
                Line((85.99999999999997, -28.5), (72.00000000000001, -28.5))
                Line((72.00000000000001, -28.5), (72.00000000000001, -40.51364520123727))
                ThreePointArc((72.00000000000001, -40.51364520123727), (78.99529030949971, -40.12845448417346), (85.99999999999997, -39.99999999999998))
            make_face()
        extrude(amount=EXTRUDE_4_DEPTH)

    # Эскиз18 → Вырез-Вытянуть11 (cut)
    with SkipClean():  # the faces are left unmerged after this step: merging them gives an invalid solid
        with BuildSketch(Plane.XY.offset(41.99999999999999)):
            with Locations((81.49999999999999, 34.25)):
                Circle(SKETCH_18_R)
            with Locations((25.999999999999996, 36.5)):
                Circle(SKETCH_18_R_2)
            with Locations(Location((81.49999999999999, -34.25, 0), (0, 0, 180))):
                Circle(SKETCH_18_R)
            with Locations(Location((25.999999999999996, -36.5, 0), (0, 0, 180))):
                Circle(SKETCH_18_R_2)
        extrude(amount=-CUT_EXTRUDE_11_DEPTH, mode=Mode.SUBTRACT)


solid = part.part
